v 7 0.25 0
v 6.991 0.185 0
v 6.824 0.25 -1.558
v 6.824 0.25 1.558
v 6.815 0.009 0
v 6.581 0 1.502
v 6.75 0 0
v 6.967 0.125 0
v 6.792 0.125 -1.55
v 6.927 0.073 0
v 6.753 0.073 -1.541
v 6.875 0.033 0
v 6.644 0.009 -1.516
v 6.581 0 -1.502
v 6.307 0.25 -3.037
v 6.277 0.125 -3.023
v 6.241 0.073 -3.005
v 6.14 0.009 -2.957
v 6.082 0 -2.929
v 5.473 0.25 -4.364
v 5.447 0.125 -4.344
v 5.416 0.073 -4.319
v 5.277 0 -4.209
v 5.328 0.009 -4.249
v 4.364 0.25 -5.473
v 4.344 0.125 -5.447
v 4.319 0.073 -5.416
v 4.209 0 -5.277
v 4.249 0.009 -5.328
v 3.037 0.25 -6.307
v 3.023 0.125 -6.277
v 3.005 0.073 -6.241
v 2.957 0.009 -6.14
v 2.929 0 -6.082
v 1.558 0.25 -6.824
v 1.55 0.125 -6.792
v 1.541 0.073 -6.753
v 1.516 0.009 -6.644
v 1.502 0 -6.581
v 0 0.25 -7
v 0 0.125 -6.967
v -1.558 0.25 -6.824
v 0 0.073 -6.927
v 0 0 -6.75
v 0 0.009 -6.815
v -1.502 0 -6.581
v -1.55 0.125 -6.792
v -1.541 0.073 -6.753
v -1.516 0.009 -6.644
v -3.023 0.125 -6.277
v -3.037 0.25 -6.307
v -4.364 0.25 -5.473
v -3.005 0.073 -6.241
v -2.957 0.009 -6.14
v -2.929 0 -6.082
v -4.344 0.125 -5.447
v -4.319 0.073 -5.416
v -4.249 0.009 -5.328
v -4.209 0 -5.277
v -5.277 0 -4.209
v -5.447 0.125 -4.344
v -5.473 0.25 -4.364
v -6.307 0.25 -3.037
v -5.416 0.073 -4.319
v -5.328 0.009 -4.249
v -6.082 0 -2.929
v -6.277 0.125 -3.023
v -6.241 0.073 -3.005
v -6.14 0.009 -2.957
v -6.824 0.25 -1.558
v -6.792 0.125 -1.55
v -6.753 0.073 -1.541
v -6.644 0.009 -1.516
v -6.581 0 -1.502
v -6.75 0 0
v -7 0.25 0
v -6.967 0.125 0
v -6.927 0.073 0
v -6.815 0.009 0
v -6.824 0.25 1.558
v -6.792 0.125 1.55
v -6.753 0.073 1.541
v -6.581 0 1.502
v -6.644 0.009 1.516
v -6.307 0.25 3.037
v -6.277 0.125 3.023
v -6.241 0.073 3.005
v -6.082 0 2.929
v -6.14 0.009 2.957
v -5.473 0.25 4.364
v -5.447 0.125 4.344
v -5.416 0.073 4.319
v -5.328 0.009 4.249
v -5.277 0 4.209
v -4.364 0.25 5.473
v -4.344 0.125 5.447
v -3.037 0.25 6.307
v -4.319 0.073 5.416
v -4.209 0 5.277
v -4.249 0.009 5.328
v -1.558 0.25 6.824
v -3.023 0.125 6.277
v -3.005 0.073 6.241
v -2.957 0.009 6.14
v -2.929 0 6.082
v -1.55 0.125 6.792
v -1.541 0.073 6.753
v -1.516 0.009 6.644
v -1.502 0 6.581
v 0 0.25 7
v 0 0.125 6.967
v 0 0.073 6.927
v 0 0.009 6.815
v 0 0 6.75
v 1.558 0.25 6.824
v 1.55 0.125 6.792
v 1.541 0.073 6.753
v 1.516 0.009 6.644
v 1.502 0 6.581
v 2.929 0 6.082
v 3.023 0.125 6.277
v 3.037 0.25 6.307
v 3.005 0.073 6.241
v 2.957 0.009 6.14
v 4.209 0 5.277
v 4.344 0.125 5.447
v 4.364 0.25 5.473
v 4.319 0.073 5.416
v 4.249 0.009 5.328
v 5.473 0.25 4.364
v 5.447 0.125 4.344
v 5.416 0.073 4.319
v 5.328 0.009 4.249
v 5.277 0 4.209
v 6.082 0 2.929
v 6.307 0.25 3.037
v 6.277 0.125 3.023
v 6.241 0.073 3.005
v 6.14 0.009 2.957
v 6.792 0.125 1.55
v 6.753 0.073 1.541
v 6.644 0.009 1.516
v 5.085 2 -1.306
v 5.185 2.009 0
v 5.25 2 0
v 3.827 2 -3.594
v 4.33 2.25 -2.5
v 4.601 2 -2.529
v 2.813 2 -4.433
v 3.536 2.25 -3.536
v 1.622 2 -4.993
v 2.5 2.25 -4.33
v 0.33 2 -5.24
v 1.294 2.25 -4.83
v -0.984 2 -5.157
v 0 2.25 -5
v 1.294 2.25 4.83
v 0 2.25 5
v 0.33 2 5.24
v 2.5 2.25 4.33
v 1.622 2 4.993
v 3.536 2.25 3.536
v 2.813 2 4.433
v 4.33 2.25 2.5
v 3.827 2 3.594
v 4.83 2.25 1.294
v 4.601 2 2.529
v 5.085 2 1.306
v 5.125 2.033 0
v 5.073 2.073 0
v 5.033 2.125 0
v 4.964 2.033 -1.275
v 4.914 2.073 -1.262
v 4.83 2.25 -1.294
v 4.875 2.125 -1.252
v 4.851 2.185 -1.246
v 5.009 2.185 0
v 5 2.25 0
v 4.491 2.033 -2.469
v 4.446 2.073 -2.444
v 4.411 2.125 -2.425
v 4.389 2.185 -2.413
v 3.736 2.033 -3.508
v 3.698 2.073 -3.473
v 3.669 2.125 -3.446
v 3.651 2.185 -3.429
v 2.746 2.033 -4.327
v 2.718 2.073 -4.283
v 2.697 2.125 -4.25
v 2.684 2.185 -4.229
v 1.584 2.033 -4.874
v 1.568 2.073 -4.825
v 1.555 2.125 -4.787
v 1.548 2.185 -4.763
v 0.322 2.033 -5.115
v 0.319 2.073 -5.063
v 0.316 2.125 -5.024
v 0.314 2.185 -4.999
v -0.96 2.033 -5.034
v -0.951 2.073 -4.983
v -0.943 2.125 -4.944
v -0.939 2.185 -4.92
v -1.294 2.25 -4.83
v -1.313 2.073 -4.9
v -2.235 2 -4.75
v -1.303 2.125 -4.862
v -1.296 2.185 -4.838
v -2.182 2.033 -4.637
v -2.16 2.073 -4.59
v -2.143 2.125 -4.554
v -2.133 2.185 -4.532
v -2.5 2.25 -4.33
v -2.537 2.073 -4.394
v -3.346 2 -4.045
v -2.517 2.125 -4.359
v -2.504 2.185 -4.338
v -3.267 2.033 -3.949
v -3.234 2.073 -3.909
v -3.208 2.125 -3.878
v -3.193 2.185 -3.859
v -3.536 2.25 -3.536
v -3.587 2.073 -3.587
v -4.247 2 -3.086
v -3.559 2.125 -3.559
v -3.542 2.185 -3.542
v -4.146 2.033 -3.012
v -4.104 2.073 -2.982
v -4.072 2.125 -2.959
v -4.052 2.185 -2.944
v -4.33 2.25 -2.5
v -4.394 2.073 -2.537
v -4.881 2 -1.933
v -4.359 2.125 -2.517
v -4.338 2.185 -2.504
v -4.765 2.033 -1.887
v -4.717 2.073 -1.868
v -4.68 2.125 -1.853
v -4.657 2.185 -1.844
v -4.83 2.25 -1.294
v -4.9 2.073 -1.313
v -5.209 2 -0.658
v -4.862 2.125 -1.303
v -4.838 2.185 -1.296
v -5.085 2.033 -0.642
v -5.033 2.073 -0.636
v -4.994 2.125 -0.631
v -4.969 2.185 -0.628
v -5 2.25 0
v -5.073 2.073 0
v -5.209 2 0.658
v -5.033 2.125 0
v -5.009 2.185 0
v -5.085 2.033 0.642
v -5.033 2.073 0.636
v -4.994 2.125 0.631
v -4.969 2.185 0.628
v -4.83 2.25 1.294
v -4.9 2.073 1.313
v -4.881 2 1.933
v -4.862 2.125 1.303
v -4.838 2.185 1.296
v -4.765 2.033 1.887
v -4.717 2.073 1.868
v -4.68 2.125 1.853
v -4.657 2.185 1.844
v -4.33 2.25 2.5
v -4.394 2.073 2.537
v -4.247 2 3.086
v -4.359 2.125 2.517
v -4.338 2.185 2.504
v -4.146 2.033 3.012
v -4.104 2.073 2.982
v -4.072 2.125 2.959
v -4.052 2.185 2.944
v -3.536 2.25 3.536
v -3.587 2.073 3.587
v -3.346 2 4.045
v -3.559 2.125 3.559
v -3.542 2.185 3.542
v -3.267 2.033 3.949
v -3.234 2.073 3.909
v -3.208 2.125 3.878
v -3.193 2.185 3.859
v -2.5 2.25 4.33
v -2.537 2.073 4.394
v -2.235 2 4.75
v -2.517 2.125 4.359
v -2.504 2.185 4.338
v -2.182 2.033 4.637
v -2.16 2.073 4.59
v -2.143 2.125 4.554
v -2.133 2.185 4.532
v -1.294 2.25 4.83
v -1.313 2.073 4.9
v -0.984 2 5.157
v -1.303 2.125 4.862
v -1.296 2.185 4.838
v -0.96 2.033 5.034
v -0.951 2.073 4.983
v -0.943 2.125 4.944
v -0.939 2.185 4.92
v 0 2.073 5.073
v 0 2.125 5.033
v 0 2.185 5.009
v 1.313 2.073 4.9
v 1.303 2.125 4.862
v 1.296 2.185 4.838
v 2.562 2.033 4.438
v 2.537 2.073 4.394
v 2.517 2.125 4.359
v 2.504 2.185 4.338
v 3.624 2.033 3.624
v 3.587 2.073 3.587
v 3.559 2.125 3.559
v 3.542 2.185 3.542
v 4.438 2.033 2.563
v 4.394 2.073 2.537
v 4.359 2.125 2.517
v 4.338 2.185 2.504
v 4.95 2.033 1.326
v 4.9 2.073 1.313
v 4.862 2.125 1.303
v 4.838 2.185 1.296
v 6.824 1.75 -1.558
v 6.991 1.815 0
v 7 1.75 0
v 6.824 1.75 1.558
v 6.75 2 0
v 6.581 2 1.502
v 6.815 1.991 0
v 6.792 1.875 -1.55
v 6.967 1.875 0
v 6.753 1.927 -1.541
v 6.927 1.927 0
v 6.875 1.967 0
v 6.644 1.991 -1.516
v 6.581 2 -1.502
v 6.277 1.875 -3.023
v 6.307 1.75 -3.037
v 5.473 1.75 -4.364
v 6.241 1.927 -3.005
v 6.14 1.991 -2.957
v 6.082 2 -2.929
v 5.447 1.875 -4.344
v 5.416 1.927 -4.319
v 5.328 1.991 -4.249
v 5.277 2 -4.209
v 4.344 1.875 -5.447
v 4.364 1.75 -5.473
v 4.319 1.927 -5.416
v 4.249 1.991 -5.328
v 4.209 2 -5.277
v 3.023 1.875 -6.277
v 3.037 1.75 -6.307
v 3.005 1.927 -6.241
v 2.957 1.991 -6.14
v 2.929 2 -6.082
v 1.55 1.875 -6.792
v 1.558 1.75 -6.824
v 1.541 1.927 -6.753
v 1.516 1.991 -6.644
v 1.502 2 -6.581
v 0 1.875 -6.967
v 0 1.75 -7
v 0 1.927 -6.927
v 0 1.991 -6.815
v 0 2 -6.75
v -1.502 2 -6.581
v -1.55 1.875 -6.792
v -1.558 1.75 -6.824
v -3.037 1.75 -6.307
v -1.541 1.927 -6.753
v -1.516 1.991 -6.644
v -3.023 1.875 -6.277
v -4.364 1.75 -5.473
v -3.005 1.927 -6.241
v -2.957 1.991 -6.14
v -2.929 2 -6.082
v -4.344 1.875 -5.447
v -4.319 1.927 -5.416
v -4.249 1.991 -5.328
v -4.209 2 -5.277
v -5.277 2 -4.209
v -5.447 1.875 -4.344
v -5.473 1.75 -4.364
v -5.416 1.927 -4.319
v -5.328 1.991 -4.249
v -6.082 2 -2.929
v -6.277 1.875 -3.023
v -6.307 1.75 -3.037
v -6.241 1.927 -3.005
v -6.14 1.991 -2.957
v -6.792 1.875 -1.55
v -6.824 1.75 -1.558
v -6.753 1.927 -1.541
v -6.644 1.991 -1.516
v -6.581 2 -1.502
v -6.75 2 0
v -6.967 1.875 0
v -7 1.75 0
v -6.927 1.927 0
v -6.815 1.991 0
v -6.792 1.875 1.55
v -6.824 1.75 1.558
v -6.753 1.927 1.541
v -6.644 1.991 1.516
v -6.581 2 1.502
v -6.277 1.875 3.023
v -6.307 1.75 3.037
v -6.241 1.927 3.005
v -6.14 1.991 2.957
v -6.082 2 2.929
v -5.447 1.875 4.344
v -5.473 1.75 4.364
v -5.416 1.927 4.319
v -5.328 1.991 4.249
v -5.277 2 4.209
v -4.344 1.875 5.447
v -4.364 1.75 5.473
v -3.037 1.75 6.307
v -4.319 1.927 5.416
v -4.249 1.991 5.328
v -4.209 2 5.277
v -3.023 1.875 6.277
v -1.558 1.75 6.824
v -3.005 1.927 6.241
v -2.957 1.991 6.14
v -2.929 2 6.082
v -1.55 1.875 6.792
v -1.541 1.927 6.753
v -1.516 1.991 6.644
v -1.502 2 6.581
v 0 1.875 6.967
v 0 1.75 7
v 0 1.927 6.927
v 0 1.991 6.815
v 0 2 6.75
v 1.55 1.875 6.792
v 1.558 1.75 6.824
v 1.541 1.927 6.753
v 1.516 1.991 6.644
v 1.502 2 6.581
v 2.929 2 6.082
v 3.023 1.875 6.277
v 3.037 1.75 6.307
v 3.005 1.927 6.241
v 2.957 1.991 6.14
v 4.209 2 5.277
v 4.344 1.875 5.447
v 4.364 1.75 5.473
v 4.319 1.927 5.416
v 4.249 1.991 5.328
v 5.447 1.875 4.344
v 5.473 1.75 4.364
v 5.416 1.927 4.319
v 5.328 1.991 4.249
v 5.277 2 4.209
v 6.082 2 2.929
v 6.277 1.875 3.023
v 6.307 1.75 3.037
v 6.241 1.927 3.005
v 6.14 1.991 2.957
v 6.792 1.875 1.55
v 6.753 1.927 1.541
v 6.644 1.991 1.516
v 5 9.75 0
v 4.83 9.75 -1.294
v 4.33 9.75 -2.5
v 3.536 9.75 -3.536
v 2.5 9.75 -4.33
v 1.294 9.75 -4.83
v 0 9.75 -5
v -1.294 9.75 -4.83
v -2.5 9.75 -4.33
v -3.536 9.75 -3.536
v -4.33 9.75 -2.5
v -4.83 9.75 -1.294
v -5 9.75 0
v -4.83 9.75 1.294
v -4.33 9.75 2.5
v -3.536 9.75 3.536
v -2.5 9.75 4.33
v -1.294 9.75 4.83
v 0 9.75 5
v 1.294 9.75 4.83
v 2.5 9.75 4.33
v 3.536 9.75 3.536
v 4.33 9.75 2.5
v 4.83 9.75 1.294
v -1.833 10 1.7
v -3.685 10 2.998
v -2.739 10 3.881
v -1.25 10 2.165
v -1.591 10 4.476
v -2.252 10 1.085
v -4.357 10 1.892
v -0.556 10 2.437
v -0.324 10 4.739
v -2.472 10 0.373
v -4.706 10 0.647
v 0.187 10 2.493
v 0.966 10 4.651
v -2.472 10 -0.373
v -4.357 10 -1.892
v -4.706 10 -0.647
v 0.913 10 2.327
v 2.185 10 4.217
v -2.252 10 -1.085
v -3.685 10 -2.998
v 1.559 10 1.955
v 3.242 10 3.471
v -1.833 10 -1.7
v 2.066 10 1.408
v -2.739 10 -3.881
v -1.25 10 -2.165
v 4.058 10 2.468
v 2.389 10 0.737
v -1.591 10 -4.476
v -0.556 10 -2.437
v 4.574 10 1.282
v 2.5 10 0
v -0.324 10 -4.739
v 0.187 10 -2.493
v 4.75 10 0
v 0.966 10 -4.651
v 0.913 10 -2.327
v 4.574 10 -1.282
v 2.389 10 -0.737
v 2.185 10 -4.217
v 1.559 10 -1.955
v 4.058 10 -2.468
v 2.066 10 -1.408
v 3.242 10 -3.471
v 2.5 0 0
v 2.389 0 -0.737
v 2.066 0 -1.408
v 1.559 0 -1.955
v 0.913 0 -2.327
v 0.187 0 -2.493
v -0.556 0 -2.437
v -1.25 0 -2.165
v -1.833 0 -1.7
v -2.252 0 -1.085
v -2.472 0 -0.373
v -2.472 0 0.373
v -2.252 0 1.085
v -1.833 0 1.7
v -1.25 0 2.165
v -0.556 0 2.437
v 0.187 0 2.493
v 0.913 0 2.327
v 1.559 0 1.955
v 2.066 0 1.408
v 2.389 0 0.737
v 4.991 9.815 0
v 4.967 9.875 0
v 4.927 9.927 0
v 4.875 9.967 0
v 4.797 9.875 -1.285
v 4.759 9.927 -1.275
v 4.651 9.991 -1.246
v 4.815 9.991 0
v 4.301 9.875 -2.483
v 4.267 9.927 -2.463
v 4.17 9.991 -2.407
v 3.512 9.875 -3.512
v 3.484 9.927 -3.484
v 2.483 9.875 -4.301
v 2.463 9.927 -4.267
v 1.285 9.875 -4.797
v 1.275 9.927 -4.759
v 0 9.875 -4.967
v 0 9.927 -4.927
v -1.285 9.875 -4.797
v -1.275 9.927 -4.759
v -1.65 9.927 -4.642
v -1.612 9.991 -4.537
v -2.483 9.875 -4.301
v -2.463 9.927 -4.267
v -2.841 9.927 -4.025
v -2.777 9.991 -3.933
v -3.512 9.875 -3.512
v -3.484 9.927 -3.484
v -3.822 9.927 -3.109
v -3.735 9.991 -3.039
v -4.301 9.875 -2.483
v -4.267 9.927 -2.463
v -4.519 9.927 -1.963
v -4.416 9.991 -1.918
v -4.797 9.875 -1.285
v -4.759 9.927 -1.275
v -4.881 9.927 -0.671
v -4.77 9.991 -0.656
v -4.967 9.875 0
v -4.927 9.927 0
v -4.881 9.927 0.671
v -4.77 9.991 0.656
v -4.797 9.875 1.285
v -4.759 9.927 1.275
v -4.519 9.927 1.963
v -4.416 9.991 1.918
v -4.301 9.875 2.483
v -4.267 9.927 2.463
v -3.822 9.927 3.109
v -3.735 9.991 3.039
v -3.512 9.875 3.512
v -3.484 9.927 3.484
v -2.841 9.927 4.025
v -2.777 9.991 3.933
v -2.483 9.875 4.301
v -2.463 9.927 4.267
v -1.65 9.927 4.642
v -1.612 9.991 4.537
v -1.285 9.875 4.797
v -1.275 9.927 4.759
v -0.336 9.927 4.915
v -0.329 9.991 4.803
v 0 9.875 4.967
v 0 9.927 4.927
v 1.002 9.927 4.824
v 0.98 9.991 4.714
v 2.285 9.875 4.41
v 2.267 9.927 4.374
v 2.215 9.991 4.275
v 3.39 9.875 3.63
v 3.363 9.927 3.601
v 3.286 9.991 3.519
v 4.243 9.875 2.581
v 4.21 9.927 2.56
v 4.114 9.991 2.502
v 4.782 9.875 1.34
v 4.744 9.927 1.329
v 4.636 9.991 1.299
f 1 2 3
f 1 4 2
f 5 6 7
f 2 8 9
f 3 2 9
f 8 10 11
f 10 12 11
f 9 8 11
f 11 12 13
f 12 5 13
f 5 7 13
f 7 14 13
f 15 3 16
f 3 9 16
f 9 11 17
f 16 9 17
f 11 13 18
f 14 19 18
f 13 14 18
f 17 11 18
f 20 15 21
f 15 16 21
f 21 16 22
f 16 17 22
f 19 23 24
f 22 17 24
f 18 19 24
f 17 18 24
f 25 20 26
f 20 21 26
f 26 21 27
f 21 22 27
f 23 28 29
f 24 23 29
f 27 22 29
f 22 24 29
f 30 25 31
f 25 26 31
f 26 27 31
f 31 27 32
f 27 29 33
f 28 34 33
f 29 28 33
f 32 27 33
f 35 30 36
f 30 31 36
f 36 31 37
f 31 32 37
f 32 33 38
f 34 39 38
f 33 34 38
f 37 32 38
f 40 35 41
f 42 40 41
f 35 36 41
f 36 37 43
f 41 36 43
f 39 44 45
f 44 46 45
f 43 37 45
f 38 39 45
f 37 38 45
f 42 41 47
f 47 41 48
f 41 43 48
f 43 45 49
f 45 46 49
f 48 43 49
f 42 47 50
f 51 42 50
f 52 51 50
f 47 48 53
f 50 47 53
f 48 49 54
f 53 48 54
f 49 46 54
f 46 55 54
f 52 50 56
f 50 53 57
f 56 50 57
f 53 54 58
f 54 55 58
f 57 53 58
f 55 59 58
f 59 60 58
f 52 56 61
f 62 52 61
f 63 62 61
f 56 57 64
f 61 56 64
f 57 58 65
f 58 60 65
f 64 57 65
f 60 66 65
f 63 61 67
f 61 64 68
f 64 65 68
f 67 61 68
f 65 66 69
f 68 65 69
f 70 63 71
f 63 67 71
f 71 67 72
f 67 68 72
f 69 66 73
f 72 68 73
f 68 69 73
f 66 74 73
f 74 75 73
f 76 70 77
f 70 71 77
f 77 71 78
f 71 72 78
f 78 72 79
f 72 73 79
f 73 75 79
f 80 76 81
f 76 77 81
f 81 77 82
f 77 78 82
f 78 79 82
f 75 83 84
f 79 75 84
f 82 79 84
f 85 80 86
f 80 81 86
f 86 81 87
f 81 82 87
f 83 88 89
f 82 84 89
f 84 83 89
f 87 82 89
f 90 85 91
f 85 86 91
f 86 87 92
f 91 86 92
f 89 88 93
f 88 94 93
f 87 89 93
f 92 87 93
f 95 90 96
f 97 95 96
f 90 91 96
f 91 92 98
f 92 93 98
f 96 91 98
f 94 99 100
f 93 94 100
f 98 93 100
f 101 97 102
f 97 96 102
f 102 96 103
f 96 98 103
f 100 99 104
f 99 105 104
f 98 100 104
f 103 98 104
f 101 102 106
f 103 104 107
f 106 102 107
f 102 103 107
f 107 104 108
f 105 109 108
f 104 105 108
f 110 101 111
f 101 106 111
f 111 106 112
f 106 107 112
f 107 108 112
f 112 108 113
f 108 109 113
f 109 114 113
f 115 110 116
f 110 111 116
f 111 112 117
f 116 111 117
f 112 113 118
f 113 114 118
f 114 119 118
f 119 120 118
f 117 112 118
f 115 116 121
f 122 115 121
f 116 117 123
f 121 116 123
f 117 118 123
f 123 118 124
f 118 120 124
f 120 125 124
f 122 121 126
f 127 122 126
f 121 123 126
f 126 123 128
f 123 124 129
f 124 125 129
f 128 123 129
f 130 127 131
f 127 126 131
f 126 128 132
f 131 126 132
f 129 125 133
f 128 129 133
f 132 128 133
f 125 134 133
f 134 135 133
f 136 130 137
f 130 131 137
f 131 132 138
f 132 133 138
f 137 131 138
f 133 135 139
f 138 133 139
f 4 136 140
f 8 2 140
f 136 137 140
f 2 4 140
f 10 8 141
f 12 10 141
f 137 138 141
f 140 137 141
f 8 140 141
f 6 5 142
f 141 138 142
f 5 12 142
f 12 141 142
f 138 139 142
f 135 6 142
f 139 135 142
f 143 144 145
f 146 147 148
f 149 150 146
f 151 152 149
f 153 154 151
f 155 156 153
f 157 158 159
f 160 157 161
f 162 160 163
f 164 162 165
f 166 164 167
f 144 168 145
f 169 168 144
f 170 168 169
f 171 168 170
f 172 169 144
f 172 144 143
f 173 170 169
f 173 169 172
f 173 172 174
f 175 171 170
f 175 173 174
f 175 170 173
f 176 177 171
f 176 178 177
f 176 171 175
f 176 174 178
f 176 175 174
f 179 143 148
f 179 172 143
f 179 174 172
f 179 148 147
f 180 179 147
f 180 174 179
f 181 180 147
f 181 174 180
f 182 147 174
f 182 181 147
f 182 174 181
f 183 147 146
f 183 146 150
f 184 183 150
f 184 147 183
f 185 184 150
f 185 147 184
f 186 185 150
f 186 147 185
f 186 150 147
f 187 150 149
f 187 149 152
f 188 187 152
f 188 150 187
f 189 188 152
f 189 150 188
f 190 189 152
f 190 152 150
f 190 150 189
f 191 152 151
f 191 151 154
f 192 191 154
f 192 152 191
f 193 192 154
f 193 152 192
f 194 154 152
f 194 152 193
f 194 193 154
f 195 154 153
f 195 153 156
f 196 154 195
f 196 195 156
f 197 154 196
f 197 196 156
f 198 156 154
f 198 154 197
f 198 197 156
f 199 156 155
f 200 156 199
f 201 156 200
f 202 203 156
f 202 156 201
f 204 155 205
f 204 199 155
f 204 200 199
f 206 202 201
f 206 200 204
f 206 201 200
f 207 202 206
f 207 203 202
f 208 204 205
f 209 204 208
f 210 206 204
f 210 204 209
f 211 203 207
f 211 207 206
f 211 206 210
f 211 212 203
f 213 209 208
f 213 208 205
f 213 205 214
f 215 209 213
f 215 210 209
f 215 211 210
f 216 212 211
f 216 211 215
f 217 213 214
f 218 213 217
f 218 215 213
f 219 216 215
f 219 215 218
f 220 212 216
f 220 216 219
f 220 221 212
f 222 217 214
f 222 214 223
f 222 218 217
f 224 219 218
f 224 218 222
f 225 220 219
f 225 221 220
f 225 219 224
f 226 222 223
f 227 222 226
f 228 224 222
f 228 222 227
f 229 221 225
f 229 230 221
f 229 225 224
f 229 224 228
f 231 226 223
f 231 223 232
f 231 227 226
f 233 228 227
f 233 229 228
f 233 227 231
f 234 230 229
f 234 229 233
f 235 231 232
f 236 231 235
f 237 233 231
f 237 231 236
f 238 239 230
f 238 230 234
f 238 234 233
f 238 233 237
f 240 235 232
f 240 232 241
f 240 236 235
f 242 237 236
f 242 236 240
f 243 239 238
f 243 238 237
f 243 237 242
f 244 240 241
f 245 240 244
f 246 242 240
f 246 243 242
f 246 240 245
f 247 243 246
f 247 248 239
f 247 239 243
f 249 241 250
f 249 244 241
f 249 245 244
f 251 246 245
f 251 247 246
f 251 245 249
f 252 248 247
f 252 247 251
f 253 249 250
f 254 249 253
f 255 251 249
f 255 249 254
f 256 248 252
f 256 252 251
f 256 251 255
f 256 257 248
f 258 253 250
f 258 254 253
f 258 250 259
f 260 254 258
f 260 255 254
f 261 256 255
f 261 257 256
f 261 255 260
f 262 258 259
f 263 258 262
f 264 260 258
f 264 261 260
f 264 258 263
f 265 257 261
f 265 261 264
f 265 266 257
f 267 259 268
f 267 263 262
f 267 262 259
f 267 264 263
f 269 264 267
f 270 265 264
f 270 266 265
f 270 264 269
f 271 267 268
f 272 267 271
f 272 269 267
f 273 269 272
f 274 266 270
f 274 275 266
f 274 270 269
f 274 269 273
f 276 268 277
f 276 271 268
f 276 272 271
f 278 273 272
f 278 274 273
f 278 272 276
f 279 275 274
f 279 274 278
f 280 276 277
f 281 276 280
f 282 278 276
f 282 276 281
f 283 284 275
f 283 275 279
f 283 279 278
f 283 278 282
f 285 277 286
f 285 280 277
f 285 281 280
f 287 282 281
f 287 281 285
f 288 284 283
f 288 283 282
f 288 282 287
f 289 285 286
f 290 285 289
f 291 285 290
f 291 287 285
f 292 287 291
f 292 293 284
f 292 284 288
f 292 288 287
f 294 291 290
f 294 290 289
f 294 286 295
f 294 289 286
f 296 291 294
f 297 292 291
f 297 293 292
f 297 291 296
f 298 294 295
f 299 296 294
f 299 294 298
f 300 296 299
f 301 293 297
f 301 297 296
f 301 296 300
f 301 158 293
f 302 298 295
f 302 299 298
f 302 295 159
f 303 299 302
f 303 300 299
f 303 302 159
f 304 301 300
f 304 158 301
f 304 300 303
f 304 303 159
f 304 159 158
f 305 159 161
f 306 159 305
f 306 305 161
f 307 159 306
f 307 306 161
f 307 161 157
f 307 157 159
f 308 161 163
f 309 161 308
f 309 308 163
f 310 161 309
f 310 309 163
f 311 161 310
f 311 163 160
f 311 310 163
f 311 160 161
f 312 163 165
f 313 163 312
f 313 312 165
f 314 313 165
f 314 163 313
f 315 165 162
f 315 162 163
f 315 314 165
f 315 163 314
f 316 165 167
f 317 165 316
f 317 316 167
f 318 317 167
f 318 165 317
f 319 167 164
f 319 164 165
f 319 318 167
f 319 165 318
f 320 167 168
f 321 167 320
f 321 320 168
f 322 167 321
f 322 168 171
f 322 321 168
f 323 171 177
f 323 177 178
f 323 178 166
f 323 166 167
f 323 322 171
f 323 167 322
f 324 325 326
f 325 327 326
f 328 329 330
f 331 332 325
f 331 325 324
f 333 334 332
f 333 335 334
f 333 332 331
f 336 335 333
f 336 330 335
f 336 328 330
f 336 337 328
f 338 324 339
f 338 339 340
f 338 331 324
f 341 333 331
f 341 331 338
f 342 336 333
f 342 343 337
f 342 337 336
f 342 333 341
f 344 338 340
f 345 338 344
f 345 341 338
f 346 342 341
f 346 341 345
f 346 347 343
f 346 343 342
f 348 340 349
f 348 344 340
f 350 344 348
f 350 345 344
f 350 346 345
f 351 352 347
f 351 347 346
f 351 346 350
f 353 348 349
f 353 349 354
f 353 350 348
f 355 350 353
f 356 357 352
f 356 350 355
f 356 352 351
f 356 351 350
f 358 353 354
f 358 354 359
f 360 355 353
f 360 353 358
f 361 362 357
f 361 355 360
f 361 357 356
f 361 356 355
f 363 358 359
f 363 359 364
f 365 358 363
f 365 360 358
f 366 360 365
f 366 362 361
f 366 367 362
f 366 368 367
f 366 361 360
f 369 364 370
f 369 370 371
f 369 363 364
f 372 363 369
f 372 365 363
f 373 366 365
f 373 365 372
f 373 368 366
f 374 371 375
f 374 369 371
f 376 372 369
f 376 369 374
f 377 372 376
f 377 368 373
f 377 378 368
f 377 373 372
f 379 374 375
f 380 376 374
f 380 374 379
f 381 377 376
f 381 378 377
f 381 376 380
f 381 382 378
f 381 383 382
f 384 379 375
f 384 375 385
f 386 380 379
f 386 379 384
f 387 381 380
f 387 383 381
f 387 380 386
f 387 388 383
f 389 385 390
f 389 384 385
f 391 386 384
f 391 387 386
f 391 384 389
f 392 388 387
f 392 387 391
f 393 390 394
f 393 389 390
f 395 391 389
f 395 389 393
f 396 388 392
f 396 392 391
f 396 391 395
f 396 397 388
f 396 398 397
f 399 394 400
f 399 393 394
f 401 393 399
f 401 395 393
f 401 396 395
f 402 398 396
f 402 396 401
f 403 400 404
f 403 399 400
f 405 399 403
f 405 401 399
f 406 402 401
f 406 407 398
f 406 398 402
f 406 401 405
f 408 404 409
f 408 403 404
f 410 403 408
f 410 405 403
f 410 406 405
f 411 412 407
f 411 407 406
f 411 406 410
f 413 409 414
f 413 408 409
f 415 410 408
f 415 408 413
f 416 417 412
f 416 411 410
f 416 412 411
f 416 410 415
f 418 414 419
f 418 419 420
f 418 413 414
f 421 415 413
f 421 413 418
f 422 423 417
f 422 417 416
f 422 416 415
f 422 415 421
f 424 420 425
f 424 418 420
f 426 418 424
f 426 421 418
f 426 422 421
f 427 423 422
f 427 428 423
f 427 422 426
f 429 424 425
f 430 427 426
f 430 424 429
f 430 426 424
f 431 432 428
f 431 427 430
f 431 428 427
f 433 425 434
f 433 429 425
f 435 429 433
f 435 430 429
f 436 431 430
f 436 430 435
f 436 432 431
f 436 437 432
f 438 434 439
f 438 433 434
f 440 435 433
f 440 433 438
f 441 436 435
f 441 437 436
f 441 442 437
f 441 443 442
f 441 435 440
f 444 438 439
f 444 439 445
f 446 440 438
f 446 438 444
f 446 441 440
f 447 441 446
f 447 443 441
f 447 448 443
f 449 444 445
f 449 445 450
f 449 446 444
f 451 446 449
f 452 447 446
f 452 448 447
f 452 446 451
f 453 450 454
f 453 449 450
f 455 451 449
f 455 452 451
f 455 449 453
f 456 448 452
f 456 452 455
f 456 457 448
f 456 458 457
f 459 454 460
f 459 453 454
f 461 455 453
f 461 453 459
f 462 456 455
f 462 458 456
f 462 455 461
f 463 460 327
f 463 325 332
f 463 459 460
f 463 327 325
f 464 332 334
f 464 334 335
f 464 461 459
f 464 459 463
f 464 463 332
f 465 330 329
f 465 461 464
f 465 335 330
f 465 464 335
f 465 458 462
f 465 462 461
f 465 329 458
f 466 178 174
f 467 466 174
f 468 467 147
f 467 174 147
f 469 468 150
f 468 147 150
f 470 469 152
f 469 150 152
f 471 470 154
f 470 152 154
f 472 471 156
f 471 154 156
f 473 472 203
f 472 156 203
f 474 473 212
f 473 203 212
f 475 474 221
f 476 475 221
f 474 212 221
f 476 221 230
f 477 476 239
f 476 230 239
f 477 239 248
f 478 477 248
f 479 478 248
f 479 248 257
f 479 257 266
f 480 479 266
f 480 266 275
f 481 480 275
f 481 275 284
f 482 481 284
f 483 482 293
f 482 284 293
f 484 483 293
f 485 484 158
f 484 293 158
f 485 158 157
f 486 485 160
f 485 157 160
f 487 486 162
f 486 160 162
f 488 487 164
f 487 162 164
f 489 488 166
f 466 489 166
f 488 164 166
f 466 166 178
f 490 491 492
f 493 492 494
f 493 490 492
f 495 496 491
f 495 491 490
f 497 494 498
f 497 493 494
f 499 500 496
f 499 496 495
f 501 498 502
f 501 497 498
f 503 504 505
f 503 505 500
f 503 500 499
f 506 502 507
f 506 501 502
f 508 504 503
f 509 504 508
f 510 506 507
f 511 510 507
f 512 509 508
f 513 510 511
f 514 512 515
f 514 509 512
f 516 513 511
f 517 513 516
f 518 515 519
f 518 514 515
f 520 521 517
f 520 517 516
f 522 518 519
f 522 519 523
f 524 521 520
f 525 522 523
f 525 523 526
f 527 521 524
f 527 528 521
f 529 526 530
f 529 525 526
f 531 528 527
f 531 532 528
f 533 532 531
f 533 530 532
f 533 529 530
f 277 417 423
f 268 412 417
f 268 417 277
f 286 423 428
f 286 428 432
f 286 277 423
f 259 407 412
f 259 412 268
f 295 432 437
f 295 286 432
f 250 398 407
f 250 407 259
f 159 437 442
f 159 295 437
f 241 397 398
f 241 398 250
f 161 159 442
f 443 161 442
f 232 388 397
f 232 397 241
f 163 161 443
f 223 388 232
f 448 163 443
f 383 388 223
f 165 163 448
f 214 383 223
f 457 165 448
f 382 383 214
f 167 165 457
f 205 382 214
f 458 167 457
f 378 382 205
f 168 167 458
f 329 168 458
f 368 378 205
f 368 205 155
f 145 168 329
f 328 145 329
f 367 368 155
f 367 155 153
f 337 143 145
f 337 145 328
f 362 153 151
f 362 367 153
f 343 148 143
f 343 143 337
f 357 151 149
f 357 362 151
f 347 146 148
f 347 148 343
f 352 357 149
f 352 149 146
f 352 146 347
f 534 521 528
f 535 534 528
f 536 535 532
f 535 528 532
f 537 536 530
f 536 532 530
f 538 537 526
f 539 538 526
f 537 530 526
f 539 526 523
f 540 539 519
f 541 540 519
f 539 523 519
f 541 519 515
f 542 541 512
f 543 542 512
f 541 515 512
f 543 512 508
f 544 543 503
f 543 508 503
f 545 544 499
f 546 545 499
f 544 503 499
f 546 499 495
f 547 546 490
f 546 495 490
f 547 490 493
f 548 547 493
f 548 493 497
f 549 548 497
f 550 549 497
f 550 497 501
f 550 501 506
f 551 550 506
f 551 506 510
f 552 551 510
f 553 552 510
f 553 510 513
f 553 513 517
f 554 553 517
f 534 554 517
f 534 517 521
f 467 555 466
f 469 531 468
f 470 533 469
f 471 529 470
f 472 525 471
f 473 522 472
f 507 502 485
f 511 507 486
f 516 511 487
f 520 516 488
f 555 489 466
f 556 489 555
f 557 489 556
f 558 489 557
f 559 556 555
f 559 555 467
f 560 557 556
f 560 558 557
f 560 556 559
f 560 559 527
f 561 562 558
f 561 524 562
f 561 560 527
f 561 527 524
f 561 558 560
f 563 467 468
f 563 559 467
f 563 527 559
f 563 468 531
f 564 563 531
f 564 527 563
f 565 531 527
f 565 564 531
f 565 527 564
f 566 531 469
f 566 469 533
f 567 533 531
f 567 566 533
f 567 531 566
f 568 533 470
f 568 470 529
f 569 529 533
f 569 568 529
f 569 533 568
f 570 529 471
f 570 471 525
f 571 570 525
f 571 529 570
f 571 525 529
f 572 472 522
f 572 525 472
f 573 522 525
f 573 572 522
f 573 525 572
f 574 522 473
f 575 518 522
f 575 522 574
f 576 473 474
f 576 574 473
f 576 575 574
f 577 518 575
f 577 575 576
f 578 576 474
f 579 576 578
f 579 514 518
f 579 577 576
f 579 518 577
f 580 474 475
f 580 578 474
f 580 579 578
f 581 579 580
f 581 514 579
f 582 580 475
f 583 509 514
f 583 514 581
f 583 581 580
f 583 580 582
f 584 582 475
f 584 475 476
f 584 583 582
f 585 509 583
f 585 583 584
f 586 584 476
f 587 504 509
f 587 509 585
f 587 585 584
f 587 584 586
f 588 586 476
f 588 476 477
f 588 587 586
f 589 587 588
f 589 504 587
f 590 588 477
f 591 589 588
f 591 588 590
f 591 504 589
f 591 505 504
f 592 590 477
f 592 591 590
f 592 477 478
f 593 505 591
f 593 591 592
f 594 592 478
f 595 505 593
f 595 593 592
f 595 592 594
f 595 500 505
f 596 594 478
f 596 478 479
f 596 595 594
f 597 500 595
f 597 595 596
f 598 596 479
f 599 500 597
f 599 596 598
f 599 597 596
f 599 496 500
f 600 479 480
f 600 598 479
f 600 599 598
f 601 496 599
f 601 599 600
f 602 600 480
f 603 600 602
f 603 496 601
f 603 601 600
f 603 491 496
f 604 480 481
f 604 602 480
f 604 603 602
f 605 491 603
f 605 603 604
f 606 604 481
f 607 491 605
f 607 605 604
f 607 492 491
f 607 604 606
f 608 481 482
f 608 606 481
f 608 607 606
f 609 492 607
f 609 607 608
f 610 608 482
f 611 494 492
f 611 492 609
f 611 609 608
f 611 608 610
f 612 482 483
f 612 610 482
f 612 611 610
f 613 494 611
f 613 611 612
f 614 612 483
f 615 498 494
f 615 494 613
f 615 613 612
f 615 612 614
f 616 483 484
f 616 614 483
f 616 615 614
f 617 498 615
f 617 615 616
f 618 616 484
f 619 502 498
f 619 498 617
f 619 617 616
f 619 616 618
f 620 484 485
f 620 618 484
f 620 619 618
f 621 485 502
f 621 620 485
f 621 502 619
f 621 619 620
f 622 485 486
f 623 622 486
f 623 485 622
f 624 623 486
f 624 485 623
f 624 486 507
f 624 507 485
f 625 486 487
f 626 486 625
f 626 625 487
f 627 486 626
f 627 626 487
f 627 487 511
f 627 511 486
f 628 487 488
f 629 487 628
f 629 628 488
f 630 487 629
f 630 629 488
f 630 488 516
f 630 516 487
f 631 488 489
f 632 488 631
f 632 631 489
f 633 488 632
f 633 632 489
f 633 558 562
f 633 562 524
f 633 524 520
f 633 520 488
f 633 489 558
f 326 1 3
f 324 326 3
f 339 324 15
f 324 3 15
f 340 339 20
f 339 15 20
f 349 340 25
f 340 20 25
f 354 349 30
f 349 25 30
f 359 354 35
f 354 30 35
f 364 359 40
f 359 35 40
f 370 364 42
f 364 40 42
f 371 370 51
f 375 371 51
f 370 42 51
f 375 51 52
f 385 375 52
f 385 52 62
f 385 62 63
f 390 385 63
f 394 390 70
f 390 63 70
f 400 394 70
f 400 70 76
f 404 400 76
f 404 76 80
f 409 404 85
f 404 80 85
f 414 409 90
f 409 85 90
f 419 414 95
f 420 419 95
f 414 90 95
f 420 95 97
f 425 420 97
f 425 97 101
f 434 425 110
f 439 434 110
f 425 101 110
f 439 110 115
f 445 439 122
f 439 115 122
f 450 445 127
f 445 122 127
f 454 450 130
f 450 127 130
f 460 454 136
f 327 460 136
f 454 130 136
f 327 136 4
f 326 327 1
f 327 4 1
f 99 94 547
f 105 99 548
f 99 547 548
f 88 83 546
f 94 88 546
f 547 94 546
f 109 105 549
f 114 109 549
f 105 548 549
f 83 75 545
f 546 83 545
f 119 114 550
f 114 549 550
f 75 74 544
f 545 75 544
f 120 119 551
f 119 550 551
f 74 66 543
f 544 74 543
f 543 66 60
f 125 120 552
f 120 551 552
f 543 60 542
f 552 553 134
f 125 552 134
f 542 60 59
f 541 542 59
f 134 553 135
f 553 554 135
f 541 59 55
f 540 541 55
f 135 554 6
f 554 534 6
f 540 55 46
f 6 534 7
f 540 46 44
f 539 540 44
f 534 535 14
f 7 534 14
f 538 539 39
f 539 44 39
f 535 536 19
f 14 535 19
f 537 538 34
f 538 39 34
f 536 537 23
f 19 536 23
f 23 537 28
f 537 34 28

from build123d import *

# Parameters (mm, degrees)
CROQUIS1_R              = 7
SALIENTE_EXTRUIR1_DEPTH = 2
CROQUIS2_R              = 5
SALIENTE_EXTRUIR2_DEPTH = 8
CROQUIS3_R              = 2.5
CORTAR_EXTRUIR1_DEPTH   = 18
REDONDEO1_R             = 0.25


with BuildPart() as part:
    # Croquis1 → Saliente-Extruir1 (new body)
    with BuildSketch(Plane(origin=(0, 0, 0), x_dir=(1, 0, 0), z_dir=(0, 1, 0))):
        Circle(CROQUIS1_R)
    extrude(amount=SALIENTE_EXTRUIR1_DEPTH)

    # Croquis2 → Saliente-Extruir2 (add)
    with BuildSketch(Plane(origin=(0, 2, 0), x_dir=(1, 0, 0), z_dir=(0, 1, 0))):
        Circle(CROQUIS2_R)
    extrude(amount=SALIENTE_EXTRUIR2_DEPTH)

    # Croquis3 → Cortar-Extruir1 (cut)
    with BuildSketch(Plane(origin=(0, 10, 0), x_dir=(1, 0, 0), z_dir=(0, 1, 0))):
        Circle(CROQUIS3_R)
    extrude(amount=-CORTAR_EXTRUIR1_DEPTH, mode=Mode.SUBTRACT)

    # Redondeo1
    redondeo1_edges = [part.edges().sort_by_distance(p)[0] for p in [
        (-7, 0, 0),
        (-7, 2, 0),
        (-5, 2, 0),
        (-5, 10, 0),
    ]]
    fillet(redondeo1_edges, radius=REDONDEO1_R)


solid = part.part
